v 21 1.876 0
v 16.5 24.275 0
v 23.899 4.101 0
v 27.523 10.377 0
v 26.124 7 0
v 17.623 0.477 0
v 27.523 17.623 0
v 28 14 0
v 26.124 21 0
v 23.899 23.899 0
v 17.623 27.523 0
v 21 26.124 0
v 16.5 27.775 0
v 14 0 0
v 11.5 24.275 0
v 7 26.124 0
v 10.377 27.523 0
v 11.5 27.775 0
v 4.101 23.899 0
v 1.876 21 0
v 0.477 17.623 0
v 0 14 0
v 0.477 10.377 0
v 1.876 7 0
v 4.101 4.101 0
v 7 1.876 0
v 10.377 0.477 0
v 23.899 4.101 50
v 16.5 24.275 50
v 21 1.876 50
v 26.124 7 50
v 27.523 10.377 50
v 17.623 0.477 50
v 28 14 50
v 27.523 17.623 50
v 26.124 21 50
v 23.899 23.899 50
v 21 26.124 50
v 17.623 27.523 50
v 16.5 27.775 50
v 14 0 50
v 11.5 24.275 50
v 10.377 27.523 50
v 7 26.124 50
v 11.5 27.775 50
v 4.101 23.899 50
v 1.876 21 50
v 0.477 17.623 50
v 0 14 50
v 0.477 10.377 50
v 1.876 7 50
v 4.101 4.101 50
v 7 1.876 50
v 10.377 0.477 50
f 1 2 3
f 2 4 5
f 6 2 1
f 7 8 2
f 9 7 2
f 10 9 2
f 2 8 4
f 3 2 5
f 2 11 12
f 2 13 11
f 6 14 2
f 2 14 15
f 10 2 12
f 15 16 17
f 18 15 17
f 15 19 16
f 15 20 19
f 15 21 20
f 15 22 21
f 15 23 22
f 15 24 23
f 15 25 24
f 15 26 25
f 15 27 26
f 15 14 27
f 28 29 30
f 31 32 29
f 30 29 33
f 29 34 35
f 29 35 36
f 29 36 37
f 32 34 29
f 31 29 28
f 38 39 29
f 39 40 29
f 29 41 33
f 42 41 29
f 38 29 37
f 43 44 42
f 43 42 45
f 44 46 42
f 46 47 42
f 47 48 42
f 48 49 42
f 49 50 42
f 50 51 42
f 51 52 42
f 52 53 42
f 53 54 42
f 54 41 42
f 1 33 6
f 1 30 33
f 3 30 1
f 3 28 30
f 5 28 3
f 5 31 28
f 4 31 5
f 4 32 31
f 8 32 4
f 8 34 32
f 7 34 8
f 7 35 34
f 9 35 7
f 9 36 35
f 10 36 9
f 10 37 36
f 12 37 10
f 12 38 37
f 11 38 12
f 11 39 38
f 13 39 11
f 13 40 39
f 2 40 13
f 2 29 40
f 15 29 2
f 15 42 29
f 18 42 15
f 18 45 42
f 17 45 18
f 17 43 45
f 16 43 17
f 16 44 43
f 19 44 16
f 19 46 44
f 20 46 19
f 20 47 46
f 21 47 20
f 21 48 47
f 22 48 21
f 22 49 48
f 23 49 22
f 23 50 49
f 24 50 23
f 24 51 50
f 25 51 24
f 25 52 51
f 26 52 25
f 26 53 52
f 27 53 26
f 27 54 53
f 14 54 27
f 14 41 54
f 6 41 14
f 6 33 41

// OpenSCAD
$fn = 32;

// ----------------------------------------------------------------------
// Keyway shaft: d28 shaft, key 5 x 3.5 mm
// ----------------------------------------------------------------------

// --- parameters (mm) ---
shaft_r = 14;             // shaft radius
key_w = 5;                // keyway width
key_d = 3.5;              // keyway depth below the surface line
plate_t = 50;             // shaft length, Z (extrusion height)

shaft_d = 2 * shaft_r;  // shaft diameter
circle_step = 15;  // polygon sampling step, degrees

profile = [[10.377, 27.523], [7, 26.124], [4.101, 23.899], [1.876, 21], [0.477, 17.623], [0, 14], [0.477, 10.377], [1.876, 7], [4.101, 4.101], [7, 1.876], [10.377, 0.477], [14, 0], [17.623, 0.477], [21, 1.876], [23.899, 4.101], [26.124, 7], [27.523, 10.377], [28, 14], [27.523, 17.623], [26.124, 21], [23.899, 23.899], [21, 26.124], [17.623, 27.523], [16.5, 27.775], [16.5, 24.275], [11.5, 24.275], [11.5, 27.775]];  // primary outline, 27 points, counter clockwise

// --- the one profile operation ---
linear_extrude(height = plate_t) polygon(points = profile);
